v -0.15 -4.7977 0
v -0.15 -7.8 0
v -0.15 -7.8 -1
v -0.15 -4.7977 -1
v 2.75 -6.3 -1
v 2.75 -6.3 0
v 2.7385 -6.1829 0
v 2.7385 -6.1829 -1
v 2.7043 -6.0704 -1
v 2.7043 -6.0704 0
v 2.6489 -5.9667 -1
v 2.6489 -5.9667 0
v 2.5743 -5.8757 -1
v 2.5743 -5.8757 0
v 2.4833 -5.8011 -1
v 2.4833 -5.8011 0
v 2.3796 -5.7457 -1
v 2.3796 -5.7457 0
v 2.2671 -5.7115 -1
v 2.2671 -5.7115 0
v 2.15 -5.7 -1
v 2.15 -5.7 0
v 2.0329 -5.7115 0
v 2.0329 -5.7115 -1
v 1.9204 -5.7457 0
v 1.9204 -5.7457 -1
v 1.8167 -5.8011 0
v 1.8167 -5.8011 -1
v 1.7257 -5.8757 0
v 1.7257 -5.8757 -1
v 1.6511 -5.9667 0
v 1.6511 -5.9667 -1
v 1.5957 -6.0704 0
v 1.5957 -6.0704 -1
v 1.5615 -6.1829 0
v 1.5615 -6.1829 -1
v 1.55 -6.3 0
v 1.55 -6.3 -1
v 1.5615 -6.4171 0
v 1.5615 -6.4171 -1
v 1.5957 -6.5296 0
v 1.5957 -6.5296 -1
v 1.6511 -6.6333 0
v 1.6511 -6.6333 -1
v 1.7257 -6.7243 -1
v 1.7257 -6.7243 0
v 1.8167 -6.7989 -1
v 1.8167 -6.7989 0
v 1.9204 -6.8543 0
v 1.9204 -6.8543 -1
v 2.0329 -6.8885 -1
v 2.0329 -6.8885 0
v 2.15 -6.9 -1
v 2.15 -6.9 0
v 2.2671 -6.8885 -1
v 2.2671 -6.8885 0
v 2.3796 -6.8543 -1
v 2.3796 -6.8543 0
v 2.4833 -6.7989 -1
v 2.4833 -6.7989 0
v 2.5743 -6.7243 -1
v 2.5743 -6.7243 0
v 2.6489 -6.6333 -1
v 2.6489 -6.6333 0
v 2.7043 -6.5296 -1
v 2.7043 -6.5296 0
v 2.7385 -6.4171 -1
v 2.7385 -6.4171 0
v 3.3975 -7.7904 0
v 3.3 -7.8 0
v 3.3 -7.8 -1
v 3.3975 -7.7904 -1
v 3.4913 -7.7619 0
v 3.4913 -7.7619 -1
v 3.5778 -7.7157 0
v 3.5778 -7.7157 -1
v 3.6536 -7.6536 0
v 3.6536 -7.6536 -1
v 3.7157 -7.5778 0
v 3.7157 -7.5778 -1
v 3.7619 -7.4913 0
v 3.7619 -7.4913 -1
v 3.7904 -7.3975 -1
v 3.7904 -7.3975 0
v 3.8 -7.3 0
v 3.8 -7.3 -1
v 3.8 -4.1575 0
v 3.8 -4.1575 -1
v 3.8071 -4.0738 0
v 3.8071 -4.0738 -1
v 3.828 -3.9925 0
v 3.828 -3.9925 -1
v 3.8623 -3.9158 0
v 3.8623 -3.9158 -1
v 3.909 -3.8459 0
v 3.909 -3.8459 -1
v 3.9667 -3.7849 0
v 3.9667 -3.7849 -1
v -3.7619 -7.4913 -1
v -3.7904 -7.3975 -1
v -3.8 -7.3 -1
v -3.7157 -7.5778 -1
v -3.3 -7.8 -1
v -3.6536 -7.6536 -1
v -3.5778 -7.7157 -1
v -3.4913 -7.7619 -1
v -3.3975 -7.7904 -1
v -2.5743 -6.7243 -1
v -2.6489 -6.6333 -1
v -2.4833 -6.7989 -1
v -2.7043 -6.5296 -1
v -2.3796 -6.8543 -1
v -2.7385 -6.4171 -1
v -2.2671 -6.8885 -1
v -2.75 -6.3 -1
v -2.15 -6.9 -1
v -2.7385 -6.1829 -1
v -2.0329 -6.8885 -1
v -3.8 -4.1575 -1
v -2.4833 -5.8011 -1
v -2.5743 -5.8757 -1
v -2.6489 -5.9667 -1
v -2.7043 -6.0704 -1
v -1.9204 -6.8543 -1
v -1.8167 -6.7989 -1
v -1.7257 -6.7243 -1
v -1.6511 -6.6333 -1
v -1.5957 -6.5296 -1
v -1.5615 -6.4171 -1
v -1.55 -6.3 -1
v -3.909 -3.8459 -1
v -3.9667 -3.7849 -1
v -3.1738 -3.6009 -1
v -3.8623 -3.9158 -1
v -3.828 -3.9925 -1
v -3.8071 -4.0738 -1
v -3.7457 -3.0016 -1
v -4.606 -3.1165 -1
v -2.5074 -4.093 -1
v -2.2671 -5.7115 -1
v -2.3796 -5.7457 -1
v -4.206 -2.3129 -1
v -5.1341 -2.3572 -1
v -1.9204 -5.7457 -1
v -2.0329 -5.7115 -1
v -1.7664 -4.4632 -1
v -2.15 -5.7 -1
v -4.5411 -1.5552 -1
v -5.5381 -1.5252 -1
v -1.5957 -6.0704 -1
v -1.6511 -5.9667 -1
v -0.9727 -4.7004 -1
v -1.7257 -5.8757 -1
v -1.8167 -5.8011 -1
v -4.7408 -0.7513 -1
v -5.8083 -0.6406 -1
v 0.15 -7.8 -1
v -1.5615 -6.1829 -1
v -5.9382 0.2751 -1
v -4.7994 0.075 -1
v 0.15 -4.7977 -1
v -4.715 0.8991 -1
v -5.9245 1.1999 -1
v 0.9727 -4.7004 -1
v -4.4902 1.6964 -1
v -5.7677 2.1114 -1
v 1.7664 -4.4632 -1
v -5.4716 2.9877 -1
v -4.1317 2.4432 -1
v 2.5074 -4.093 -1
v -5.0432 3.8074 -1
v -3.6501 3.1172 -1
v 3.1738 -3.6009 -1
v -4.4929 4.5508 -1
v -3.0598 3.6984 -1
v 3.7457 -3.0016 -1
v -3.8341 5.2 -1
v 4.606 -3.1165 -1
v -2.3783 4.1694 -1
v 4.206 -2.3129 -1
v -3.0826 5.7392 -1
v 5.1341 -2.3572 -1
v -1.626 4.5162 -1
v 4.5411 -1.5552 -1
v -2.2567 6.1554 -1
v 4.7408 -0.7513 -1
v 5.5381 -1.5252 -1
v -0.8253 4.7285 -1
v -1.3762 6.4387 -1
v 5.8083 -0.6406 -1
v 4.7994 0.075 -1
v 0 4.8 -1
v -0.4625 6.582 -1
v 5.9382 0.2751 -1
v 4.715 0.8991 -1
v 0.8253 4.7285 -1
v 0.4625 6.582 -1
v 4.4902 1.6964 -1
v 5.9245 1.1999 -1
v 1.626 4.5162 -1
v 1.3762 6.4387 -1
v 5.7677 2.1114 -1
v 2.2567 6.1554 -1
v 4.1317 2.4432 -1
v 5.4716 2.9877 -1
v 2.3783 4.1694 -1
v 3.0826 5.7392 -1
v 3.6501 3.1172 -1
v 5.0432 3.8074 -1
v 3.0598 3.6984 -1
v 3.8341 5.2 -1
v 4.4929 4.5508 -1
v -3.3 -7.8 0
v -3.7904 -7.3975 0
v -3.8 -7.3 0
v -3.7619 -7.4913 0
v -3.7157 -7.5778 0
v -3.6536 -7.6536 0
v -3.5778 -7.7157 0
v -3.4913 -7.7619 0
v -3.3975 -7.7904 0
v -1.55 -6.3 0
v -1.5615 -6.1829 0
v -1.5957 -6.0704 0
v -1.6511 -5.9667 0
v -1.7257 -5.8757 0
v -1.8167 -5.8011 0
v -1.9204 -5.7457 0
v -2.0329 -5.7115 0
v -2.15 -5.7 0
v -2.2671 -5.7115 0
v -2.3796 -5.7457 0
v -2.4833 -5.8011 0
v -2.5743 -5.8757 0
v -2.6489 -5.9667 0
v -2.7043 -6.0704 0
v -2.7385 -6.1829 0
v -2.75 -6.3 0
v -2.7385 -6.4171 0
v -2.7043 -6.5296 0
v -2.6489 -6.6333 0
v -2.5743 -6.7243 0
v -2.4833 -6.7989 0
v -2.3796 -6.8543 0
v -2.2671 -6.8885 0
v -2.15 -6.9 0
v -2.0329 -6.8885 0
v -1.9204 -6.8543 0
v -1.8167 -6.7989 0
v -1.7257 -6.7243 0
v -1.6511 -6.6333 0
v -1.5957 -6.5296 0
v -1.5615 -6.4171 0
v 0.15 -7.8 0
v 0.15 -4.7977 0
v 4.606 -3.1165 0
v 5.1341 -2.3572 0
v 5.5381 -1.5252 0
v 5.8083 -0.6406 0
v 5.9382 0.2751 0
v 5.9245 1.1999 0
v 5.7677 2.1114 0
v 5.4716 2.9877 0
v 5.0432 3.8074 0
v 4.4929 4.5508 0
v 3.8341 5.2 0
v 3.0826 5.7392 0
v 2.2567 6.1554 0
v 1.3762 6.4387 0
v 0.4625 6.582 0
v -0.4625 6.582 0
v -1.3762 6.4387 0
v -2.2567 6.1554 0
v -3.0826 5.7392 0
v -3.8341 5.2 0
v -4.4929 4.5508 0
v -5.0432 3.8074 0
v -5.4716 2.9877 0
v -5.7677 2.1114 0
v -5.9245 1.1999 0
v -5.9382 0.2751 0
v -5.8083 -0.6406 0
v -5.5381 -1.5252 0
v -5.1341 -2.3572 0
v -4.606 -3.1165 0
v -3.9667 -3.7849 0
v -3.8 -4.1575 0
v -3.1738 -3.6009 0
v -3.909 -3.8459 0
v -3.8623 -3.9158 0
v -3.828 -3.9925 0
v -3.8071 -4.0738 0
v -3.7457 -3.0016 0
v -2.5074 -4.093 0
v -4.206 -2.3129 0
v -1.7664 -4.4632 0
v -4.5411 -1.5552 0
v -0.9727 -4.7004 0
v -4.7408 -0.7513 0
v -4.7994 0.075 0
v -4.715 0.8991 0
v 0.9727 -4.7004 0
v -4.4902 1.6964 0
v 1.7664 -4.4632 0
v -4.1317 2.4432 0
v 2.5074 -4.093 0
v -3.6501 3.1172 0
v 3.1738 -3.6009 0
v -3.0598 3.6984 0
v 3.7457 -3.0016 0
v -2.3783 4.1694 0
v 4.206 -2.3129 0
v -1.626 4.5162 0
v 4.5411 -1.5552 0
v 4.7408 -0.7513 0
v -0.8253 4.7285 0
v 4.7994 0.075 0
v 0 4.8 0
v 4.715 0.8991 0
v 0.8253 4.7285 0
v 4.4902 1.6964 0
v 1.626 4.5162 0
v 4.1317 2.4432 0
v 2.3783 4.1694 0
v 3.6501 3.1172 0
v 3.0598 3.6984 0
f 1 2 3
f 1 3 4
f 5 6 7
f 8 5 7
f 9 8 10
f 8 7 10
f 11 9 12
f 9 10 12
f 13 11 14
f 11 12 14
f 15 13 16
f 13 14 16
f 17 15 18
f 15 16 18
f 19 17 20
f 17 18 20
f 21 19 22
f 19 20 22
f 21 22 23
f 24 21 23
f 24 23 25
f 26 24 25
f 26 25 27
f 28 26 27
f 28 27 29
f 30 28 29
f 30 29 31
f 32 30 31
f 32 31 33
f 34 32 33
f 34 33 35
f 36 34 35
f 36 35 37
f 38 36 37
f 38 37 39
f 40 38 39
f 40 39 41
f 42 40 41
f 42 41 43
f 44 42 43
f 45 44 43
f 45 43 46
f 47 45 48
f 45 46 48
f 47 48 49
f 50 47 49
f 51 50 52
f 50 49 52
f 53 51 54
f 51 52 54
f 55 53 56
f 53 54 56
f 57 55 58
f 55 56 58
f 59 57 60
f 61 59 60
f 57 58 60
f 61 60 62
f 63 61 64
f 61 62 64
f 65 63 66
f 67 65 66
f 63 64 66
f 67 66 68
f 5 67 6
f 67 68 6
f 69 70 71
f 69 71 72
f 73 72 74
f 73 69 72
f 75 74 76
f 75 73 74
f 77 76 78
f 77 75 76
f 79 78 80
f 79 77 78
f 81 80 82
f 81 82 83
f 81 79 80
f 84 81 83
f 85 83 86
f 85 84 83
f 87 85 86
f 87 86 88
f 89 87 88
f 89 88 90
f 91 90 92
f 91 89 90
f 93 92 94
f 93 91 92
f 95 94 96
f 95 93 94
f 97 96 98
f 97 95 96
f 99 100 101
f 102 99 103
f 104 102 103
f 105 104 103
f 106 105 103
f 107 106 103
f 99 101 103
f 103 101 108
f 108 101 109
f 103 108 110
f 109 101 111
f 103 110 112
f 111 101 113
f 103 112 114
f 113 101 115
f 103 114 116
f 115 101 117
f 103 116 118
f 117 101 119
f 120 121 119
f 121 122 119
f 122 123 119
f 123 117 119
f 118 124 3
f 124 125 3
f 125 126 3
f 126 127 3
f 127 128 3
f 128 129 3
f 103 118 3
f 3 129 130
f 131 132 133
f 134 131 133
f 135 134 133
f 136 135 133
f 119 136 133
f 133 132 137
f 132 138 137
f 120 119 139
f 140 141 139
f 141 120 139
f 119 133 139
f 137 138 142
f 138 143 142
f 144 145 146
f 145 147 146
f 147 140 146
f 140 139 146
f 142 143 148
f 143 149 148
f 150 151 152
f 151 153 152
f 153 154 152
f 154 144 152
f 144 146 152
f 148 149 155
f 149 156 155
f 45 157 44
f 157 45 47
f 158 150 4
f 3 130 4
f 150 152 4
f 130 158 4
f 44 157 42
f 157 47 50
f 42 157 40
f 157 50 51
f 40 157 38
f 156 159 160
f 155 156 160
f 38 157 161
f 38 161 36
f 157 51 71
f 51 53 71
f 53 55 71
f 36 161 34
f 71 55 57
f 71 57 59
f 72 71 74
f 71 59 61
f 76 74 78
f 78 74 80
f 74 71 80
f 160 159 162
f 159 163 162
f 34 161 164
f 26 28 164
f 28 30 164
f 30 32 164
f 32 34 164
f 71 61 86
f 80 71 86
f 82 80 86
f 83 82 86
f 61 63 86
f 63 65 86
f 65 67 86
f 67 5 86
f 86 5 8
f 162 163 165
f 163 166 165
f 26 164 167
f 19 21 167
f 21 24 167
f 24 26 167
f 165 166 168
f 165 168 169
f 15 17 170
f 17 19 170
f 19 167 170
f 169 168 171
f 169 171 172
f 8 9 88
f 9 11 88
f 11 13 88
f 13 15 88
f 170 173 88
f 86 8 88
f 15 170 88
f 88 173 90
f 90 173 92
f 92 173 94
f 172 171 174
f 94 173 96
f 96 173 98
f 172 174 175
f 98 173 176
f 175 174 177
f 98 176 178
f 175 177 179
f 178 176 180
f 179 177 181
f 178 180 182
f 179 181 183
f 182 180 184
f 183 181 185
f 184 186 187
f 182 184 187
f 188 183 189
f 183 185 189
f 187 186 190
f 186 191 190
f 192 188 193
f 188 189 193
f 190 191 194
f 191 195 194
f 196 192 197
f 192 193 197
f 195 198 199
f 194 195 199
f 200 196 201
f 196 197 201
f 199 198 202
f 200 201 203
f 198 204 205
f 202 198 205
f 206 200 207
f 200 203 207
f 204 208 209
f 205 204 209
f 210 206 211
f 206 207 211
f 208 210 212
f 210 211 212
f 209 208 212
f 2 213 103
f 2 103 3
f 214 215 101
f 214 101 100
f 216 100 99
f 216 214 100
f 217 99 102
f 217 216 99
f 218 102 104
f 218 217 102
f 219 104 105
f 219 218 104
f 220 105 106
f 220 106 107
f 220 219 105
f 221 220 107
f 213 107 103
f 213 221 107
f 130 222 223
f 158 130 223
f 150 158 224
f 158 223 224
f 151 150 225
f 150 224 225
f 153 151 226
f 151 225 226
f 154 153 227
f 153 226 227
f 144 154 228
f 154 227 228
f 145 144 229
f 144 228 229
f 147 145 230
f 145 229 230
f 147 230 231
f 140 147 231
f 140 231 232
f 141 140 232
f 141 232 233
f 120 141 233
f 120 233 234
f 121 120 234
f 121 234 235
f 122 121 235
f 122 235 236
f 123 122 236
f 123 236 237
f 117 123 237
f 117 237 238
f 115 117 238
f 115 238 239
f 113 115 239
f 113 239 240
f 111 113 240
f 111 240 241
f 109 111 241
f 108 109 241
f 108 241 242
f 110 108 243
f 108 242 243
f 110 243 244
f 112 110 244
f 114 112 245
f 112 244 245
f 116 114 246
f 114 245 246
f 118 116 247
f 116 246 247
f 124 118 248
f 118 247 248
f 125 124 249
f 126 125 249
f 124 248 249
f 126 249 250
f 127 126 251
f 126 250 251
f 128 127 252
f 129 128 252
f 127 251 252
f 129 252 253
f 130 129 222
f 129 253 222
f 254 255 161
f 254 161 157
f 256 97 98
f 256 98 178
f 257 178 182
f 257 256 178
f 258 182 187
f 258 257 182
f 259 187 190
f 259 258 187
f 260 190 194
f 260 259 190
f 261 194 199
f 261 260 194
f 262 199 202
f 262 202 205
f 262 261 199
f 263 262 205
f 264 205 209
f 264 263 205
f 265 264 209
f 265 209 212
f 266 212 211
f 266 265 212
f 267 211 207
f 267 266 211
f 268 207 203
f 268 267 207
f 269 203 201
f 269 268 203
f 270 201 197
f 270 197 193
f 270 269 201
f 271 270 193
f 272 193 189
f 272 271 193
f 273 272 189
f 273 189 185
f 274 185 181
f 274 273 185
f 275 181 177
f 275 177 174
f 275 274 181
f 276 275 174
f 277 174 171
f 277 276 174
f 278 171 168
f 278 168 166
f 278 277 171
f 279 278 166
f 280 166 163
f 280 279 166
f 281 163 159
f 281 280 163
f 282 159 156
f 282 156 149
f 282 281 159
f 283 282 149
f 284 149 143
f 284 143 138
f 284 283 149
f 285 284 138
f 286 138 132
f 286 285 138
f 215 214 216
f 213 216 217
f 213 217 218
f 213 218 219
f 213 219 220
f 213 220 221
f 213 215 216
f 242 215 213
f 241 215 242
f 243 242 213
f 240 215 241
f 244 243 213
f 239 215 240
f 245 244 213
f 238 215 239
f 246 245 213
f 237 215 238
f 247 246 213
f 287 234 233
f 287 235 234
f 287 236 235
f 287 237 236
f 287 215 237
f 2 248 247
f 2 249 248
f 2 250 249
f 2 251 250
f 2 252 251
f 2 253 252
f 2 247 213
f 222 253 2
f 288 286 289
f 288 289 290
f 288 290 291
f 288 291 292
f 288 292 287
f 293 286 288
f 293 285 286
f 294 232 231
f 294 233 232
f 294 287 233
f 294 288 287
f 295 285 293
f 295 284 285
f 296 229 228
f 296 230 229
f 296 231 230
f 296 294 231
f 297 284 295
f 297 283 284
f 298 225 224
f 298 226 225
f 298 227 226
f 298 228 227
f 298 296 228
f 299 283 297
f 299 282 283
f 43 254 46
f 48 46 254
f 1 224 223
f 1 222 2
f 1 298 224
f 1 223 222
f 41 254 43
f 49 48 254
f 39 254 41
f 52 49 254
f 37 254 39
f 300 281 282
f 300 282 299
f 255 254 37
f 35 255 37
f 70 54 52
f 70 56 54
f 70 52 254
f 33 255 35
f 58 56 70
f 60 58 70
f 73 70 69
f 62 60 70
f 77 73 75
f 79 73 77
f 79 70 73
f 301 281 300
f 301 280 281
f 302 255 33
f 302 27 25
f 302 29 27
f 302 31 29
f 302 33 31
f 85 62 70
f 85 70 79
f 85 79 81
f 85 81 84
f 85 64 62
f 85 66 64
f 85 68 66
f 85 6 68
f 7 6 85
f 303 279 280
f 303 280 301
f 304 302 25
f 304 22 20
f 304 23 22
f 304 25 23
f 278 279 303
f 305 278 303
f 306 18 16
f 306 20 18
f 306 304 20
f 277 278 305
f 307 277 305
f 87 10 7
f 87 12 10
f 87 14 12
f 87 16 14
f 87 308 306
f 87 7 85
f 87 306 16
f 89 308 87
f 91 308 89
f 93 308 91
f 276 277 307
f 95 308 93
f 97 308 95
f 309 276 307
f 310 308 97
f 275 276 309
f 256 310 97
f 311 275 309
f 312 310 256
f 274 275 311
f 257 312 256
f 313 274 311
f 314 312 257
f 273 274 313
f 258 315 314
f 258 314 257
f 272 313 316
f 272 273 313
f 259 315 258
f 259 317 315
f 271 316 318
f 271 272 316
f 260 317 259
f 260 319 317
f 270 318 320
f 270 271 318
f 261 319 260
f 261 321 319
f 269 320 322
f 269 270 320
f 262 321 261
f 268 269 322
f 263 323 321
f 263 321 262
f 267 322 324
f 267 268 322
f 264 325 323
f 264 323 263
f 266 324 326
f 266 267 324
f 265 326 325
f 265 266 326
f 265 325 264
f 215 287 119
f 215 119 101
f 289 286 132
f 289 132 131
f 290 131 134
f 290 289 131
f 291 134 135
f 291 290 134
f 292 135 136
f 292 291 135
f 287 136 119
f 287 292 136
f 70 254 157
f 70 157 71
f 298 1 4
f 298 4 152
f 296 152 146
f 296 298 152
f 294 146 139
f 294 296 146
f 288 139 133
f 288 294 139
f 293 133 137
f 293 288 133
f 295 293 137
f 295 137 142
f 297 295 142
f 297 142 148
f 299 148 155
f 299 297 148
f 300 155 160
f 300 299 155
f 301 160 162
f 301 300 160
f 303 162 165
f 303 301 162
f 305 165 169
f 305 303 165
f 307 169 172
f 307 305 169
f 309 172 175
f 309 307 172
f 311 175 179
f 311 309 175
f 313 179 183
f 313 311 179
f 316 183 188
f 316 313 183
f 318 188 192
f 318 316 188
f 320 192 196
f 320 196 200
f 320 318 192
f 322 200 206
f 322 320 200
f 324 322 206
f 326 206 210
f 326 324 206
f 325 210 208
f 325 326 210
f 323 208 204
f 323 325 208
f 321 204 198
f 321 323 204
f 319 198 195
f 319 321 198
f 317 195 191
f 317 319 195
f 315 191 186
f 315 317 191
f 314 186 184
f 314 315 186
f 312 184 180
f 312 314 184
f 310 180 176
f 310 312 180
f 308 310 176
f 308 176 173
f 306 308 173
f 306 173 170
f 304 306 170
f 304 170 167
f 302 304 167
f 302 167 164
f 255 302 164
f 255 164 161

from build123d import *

# Parameters (mm, degrees)
BOSS_EXTRUDE1_DEPTH = 1
SKETCH2_R           = 0.6
CUT_EXTRUDE1_DEPTH  = 10.861161189


with BuildPart() as part:
    # Sketch1 → Boss-Extrude1 (new body)
    with BuildSketch(Plane.XY):
        with BuildLine():
            Line((-3.8, -4.157546152), (-3.8, -7.3))
            ThreePointArc((-3.8, -7.3), (-3.653553391, -7.653553391), (-3.3, -7.8))
            Line((-3.3, -7.8), (-0.15, -7.8))
            Line((-0.15, -7.8), (-0.15, -4.797655678))
            ThreePointArc((-0.15, -4.797655678), (0, 4.8), (0.15, -4.797655678))
            Line((0.15, -4.797655678), (0.15, -7.8))
            Line((0.15, -7.8), (3.3, -7.8))
            ThreePointArc((3.3, -7.8), (3.653553391, -7.653553391), (3.8, -7.3))
            Line((3.8, -7.3), (3.8, -4.157546152))
            ThreePointArc((3.8, -4.157546152), (3.843564535, -3.953422006), (3.966666667, -3.784868155))
            ThreePointArc((3.966666667, -3.784868155), (0, 6.6), (-3.966666667, -3.784868155))
            ThreePointArc((-3.966666667, -3.784868155), (-3.843564535, -3.953422006), (-3.8, -4.157546152))
        make_face()
    extrude(amount=-BOSS_EXTRUDE1_DEPTH)

    # Sketch2 → Cut-Extrude1 (cut, through all)
    with BuildSketch(Plane.XY):
        with Locations((-2.15, -6.3)):
            Circle(SKETCH2_R)
        with Locations((2.15, -6.3)):
            Circle(SKETCH2_R)
    extrude(amount=-CUT_EXTRUDE1_DEPTH, mode=Mode.SUBTRACT)


solid = part.part
